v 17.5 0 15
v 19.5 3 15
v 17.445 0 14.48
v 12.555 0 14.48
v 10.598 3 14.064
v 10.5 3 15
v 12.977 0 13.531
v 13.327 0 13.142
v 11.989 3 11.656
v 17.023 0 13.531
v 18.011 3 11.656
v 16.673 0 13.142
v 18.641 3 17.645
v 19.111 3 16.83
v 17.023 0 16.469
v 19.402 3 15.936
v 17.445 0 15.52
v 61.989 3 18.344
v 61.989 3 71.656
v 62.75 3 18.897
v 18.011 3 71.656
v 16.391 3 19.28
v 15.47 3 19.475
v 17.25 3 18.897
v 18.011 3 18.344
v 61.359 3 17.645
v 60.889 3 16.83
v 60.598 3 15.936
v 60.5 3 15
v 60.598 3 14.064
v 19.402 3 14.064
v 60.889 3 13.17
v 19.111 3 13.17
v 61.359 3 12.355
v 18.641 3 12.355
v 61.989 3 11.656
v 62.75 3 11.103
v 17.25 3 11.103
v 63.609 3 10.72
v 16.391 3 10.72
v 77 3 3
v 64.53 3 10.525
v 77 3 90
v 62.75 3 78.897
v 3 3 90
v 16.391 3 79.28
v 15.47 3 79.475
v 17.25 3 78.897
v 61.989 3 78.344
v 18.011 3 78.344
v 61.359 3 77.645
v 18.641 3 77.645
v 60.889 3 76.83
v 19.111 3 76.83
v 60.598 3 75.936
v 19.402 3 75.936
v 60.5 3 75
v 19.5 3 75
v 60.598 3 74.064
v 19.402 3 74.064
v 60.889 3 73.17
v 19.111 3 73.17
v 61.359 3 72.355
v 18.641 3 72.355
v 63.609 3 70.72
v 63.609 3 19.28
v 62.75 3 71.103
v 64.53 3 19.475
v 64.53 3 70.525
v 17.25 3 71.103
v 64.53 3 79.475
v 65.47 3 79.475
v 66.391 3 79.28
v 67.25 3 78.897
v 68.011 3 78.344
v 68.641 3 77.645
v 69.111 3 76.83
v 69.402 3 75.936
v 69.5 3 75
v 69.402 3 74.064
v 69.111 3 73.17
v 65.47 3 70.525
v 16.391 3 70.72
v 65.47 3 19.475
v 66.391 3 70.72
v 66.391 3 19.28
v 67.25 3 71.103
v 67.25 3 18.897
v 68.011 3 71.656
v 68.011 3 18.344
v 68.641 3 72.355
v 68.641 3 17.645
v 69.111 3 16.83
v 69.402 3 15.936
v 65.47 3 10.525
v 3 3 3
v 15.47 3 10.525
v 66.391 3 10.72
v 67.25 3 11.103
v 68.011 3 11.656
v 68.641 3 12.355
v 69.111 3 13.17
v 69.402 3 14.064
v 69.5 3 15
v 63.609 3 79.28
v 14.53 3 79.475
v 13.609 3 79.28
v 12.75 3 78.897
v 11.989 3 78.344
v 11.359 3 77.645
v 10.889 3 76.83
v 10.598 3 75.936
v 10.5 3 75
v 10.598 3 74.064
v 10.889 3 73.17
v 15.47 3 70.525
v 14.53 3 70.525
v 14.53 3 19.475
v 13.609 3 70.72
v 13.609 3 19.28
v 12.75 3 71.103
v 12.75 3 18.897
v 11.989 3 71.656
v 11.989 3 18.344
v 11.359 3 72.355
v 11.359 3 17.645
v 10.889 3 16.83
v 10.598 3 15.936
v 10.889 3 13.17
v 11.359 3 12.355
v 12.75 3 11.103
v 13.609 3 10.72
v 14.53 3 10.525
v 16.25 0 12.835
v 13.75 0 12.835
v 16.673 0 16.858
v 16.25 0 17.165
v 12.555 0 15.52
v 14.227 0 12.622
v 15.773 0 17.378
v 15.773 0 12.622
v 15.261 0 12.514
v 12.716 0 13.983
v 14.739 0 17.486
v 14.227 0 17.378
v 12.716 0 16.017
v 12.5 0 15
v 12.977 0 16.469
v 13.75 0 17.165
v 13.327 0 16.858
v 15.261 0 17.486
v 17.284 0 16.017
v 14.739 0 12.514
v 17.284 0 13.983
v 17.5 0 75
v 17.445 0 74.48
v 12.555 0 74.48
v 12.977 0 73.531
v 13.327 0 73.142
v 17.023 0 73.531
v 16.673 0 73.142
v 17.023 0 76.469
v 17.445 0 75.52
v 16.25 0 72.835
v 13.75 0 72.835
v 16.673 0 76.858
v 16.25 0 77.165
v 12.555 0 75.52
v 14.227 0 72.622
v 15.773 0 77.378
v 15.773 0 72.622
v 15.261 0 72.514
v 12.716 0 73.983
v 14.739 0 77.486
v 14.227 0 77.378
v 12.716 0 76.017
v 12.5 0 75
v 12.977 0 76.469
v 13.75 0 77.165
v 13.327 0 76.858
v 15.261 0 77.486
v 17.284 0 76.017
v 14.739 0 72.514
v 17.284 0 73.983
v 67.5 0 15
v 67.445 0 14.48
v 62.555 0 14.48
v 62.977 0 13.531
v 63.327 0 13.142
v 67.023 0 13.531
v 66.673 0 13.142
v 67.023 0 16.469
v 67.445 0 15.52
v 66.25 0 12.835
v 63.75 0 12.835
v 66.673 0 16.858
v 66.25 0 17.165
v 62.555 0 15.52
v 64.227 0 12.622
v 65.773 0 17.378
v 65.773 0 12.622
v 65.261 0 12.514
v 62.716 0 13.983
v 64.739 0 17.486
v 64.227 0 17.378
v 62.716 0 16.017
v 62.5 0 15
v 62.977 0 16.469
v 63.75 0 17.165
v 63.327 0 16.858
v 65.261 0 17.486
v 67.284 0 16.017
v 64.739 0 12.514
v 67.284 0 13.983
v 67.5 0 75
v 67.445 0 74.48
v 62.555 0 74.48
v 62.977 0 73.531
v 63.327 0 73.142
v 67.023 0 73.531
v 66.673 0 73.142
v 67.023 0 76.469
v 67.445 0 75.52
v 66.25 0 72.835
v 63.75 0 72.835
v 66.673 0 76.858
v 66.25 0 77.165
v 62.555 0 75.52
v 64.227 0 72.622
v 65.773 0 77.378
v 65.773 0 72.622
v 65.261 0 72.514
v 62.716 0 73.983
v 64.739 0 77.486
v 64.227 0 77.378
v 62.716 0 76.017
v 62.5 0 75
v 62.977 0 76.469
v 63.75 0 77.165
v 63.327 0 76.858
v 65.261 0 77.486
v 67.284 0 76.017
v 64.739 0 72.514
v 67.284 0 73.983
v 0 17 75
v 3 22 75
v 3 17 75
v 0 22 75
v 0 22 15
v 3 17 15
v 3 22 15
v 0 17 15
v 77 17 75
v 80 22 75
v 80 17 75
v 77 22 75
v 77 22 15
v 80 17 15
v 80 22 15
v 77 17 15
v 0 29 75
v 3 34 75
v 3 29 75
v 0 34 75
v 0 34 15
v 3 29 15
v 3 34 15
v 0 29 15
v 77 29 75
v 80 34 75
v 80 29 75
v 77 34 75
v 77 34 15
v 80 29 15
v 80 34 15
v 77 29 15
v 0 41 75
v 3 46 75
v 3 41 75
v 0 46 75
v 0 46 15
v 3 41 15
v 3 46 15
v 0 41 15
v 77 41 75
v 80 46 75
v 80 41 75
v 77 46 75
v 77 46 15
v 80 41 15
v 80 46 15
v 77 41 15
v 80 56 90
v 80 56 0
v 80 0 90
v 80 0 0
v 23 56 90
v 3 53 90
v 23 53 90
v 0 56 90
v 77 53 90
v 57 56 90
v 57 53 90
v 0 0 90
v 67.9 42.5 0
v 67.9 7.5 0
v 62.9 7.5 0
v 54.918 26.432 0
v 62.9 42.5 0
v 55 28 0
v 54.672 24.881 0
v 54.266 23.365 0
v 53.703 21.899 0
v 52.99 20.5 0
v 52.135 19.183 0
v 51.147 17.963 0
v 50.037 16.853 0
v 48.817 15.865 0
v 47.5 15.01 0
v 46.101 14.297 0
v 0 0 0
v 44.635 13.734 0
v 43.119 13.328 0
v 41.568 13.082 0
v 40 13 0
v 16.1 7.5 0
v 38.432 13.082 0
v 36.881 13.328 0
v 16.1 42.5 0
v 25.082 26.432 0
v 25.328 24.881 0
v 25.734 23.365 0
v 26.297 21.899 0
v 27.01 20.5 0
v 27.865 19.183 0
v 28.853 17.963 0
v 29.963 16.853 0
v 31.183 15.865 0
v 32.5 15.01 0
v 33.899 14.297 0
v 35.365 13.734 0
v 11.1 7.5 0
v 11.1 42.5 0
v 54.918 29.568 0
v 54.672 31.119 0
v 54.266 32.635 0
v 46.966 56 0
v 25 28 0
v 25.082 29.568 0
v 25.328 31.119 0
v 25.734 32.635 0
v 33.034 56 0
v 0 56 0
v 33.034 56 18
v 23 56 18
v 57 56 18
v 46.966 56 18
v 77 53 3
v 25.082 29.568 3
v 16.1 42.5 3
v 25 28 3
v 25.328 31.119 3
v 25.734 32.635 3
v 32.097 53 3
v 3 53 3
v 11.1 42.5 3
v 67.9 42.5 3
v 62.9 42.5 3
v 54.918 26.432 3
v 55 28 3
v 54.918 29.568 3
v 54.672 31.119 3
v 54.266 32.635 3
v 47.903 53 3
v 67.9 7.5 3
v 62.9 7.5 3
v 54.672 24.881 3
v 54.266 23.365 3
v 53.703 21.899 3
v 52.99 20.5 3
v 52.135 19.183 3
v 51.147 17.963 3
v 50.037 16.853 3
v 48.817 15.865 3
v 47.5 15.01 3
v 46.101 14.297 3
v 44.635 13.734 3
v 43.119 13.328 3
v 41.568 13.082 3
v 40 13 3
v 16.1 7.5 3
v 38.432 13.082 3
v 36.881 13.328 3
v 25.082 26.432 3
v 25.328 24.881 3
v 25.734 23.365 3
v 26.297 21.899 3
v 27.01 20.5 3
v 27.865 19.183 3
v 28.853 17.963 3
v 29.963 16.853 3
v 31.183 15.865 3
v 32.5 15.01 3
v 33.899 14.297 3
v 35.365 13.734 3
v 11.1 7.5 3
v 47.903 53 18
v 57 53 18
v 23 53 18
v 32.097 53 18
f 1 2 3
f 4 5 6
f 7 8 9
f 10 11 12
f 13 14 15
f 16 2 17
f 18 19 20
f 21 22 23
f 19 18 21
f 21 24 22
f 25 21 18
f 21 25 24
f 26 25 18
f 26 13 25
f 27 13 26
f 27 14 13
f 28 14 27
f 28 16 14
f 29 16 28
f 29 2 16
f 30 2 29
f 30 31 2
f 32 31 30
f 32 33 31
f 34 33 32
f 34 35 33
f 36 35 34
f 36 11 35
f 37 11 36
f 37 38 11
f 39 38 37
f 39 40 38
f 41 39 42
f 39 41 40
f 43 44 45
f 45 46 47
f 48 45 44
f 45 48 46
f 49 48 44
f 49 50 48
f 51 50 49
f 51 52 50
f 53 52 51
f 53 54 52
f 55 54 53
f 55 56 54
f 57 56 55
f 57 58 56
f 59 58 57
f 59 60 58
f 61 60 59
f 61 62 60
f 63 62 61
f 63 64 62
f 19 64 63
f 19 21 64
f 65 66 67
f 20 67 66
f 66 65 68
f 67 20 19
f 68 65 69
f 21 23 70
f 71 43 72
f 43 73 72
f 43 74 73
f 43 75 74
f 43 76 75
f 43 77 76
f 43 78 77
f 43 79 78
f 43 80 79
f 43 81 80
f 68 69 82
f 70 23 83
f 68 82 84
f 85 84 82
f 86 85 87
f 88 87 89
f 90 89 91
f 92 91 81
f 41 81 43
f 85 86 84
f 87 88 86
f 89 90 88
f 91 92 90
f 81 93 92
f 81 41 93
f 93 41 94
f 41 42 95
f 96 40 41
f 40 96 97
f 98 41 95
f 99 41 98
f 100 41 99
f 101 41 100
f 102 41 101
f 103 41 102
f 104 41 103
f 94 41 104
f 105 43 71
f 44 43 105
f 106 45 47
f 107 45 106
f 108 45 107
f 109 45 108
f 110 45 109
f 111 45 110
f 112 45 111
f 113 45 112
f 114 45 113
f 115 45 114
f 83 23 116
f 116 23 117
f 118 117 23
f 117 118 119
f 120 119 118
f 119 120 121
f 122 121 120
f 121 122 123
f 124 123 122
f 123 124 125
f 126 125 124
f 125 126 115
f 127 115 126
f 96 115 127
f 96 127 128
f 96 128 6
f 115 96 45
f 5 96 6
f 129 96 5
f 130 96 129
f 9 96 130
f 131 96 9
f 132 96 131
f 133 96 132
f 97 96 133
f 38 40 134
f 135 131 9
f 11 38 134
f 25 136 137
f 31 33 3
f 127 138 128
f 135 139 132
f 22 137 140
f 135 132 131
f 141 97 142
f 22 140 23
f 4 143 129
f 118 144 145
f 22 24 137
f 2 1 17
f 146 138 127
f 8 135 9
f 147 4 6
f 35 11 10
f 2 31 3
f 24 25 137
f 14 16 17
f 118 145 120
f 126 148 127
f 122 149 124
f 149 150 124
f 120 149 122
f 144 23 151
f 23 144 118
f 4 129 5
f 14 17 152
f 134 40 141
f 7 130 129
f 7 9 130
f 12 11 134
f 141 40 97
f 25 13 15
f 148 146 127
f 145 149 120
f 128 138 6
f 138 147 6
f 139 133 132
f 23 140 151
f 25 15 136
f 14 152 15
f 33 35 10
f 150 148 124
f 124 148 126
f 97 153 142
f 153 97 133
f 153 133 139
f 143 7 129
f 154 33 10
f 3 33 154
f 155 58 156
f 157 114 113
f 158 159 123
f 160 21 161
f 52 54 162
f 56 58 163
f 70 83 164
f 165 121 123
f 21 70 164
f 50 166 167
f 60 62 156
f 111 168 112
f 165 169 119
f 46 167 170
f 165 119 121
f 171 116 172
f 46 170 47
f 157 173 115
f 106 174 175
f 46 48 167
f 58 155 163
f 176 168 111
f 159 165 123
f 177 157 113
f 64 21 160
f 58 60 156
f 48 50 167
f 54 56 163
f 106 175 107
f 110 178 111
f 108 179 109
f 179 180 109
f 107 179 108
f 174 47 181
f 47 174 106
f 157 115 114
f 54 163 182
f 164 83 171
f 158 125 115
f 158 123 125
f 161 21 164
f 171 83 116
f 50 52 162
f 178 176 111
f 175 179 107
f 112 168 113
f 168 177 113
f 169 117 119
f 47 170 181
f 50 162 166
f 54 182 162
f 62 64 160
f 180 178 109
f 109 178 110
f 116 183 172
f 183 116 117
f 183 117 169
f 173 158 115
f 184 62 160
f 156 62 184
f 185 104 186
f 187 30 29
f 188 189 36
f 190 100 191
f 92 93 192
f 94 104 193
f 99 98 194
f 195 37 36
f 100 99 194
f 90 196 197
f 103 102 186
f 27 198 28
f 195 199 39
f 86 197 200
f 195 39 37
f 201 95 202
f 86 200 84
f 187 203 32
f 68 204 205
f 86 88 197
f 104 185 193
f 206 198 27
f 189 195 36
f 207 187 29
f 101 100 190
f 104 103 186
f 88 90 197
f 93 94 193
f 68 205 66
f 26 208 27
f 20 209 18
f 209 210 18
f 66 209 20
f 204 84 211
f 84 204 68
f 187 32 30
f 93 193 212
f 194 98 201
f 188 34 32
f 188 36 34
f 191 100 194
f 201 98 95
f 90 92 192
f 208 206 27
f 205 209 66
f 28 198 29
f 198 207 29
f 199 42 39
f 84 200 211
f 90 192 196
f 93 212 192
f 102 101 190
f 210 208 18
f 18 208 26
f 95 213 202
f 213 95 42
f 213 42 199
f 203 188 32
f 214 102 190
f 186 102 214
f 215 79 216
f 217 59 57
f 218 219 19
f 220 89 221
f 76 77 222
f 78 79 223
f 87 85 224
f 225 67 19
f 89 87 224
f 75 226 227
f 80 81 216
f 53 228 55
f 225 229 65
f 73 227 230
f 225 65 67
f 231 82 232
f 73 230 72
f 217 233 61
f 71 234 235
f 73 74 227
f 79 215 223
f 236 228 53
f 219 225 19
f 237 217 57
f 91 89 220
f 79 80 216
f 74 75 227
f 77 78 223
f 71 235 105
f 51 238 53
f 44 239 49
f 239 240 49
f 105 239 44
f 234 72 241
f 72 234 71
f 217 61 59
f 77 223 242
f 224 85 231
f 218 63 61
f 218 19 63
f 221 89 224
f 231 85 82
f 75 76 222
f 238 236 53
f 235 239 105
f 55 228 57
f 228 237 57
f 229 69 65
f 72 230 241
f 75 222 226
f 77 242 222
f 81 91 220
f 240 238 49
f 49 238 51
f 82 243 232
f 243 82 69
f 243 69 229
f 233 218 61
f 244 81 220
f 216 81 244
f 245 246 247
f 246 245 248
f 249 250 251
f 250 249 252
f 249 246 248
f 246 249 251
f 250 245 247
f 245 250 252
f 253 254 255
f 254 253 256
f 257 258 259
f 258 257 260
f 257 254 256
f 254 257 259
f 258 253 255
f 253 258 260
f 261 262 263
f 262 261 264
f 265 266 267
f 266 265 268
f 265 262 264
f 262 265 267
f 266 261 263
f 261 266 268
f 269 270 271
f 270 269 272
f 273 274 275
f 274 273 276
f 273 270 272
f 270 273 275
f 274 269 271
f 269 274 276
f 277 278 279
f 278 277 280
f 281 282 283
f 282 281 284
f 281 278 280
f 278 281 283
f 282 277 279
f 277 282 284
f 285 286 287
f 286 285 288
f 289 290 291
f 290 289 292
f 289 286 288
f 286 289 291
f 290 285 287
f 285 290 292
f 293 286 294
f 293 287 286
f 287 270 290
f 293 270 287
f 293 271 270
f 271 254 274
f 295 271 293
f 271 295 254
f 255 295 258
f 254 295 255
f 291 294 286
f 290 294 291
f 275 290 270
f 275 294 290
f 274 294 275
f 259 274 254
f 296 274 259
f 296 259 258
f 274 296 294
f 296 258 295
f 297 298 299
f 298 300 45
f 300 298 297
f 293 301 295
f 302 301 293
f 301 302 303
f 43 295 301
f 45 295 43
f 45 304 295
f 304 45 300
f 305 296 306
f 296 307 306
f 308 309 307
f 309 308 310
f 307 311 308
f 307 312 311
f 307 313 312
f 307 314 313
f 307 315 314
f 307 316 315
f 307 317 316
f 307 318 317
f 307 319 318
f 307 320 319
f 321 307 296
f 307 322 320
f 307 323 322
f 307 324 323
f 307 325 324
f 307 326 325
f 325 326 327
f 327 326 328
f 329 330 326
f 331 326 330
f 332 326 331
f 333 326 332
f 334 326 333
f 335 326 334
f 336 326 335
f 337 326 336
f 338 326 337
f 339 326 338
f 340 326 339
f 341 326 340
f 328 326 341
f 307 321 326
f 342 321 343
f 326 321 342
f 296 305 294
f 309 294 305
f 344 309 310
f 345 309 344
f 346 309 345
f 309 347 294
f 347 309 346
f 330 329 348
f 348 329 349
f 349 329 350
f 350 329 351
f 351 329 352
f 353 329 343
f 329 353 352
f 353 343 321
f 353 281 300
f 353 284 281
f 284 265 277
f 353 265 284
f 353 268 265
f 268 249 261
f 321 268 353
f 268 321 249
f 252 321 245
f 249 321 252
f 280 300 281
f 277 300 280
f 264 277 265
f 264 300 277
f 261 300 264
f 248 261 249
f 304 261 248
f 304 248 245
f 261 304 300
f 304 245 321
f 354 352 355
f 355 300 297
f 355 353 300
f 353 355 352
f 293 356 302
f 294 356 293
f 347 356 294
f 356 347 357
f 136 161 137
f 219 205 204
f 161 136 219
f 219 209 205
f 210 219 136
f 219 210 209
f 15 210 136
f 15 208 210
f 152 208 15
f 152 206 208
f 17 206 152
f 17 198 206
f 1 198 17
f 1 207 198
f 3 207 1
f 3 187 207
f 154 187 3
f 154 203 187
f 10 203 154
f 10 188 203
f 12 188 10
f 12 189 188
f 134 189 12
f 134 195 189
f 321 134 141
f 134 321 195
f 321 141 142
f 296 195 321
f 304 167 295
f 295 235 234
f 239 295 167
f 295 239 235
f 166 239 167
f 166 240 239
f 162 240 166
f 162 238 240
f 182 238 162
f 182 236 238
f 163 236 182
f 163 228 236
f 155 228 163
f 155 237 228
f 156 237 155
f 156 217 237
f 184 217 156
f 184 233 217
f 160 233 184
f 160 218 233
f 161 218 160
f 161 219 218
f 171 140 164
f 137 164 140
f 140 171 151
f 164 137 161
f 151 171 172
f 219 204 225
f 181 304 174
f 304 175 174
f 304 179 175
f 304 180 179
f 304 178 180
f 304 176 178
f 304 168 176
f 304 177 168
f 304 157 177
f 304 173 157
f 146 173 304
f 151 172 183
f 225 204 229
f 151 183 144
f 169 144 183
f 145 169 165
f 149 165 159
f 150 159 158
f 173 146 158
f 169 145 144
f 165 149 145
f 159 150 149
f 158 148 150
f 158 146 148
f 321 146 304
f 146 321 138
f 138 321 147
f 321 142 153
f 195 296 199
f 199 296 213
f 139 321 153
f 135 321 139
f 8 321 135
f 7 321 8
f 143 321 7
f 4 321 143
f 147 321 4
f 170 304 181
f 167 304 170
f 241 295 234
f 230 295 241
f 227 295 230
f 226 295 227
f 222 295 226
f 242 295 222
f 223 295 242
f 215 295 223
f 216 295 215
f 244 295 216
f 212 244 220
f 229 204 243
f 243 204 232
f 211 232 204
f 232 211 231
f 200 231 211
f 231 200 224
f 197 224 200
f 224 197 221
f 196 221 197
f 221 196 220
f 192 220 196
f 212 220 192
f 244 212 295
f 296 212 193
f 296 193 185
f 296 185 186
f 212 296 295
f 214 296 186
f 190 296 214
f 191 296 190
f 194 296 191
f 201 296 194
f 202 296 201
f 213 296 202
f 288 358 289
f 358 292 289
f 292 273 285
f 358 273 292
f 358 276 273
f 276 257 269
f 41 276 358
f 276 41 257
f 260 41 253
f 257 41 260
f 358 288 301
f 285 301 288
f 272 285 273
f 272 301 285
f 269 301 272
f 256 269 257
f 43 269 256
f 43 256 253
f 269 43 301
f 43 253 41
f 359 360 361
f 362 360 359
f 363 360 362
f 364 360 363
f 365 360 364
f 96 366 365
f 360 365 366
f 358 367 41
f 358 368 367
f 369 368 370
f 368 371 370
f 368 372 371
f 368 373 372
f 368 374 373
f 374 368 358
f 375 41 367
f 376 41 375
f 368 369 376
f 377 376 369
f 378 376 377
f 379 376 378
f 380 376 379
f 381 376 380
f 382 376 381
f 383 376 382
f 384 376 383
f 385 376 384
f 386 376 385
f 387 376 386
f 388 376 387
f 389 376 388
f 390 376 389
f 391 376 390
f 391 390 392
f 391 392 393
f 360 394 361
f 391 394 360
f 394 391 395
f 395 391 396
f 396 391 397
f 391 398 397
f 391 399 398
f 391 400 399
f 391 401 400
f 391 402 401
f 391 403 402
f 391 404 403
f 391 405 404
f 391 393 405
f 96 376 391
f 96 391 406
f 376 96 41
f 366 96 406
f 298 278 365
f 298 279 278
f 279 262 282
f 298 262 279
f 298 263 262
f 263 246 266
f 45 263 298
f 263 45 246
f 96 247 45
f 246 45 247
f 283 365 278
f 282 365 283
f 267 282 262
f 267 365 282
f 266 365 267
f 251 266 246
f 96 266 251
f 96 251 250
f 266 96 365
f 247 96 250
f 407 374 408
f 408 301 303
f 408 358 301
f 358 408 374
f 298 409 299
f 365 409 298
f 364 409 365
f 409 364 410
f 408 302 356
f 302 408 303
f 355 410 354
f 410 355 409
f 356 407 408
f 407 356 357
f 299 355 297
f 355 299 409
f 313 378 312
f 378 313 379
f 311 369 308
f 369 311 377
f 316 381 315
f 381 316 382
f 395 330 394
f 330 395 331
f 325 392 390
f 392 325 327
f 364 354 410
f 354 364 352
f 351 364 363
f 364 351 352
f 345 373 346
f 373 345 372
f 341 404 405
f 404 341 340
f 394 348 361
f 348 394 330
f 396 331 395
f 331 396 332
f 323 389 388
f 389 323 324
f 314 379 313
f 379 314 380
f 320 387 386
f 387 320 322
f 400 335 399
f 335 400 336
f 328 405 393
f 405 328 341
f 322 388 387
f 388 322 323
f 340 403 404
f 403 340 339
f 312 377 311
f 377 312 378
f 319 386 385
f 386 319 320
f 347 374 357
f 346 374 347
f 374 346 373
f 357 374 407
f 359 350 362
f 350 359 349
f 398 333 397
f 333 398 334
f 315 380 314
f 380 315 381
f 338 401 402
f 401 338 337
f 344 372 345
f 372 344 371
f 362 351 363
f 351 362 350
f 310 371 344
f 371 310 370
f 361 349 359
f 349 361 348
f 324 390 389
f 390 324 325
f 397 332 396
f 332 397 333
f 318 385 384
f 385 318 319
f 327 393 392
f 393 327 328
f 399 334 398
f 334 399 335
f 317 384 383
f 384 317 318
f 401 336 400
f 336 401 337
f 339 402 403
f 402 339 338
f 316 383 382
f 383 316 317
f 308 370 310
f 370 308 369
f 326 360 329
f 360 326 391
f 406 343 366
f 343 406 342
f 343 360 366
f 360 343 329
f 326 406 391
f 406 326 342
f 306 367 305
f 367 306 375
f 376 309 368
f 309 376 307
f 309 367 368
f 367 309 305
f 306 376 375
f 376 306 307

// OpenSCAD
// --- PARAMÈTRES DU CHARGEUR ---

epaisseur_paroi = 3;        // Épaisseur du plastique

// MOREC BS-PCD018
largeur_chargeur = 74;      // Largeur du boîtier
epaisseur_chargeur = 50;    // Épaisseur (profondeur) du boîtier
hauteur_support = 90;       // Hauteur totale de la demi-boîte
diametre_cable_haut = 30;   // Encoche de 30mm pour le passage du câble
diametre_cable_bas = 13;    // Encoche de 30mm pour le passage du câble

// ouverture devant
rebord = 20; // Largeur de la lèvre de maintien à gauche et à droite
hauteur_rebord_bas = 15; // Hauteur du rebord plein en bas

// --- PARAMÈTRES DE FIXATION ---
diametre_vis = 5;           // Diamètre du filetage de la vis murale
diametre_tete_vis = 9;      // Diamètre de la tête de vis (pour le fraisage)

module support_mural() {
    difference() {
        // 1. Corps principal extérieur
        cube([
            largeur_chargeur + (2 * epaisseur_paroi),
            epaisseur_chargeur + (2 * epaisseur_paroi),
            hauteur_support
        ]);

        // 2. Évidement central (pour glisser le chargeur, ouvert en haut)
        translate([epaisseur_paroi, epaisseur_paroi, epaisseur_paroi])
            cube([
                largeur_chargeur, 
                epaisseur_chargeur, 
                hauteur_support + 1
            ]);

        // 3. Fenêtre frontale (garde des rebords pour bloquer le chargeur)
        translate([epaisseur_paroi + rebord, epaisseur_paroi + epaisseur_chargeur - 1, epaisseur_paroi + hauteur_rebord_bas])
            cube([
                largeur_chargeur - (2 * rebord), 
                epaisseur_paroi + 2, 
                hauteur_support
            ]);

        // 4. Encoche en U pour le câble en bas (diamètre 30mm)
        hull() {
          translate([(largeur_chargeur + 2*epaisseur_paroi)/2, epaisseur_paroi + epaisseur_chargeur/2, -1]) {
              // Le trou rond
              cylinder(h = epaisseur_paroi + 2, d = diametre_cable_haut, $fn=60);
              // L'ouverture vers l'avant pour former le U
                  //cube([diametre_cable_haut, epaisseur_chargeur + epaisseur_paroi, epaisseur_paroi + 2]);
          }
          translate([(largeur_chargeur + 2*epaisseur_paroi)/2, epaisseur_chargeur+diametre_cable_bas/2, -1]) {
              cylinder(h = hauteur_support + 2, d = diametre_cable_bas, $fn=60);
          }
        }
        
        // 5. Trous de fixation murale (dans le dos de la boîte)
        marge_vis = 15;
        for (x = [marge_vis, largeur_chargeur + 2*epaisseur_paroi - marge_vis]) {
            for (z = [marge_vis, hauteur_support - marge_vis]) {
                translate([x, -1, z]) {
                    rotate([-90, 0, 0]) {
                        // Trou pour la tige de la vis
                        cylinder(h = epaisseur_paroi + 2, d = diametre_vis, $fn=30);
                        // Fraisage conique pour cacher la tête de vis à l'intérieur
                        translate([0, 0, epaisseur_paroi - 2])
                            cylinder(h = 3, d1 = diametre_vis, d2 = diametre_tete_vis, $fn=30);
                    }
                }
            }
        }

        // 6. Ouvertures de ventilation latérales pour la dissipation thermique
        largeur_fente = 5;
        hauteur_fente = hauteur_support - 30;
        espacement_fente = 12;
        nb_fentes = floor((epaisseur_chargeur - 10) / espacement_fente);

        for (i = [1 : nb_fentes]) {
            // Découpes flanc gauche
            translate([-1, epaisseur_paroi + 2 + i*espacement_fente, 15])
                cube([epaisseur_paroi + 2, largeur_fente, hauteur_fente]);
            // Découpes flanc droit
            translate([largeur_chargeur + epaisseur_paroi - 1, epaisseur_paroi + 2 + i*espacement_fente, 15])
                cube([epaisseur_paroi + 2, largeur_fente, hauteur_fente]);
        }
        translate([largeur_chargeur*.15, (epaisseur_chargeur - epaisseur_chargeur*.7)/2, -1])
          cube([epaisseur_paroi + 2, epaisseur_chargeur*.7, largeur_fente]);
        translate([largeur_chargeur*.85, (epaisseur_chargeur - epaisseur_chargeur*.7)/2, -1])
          cube([epaisseur_paroi + 2, epaisseur_chargeur*.7, largeur_fente]);
    }
}

// Rendu final
support_mural();
